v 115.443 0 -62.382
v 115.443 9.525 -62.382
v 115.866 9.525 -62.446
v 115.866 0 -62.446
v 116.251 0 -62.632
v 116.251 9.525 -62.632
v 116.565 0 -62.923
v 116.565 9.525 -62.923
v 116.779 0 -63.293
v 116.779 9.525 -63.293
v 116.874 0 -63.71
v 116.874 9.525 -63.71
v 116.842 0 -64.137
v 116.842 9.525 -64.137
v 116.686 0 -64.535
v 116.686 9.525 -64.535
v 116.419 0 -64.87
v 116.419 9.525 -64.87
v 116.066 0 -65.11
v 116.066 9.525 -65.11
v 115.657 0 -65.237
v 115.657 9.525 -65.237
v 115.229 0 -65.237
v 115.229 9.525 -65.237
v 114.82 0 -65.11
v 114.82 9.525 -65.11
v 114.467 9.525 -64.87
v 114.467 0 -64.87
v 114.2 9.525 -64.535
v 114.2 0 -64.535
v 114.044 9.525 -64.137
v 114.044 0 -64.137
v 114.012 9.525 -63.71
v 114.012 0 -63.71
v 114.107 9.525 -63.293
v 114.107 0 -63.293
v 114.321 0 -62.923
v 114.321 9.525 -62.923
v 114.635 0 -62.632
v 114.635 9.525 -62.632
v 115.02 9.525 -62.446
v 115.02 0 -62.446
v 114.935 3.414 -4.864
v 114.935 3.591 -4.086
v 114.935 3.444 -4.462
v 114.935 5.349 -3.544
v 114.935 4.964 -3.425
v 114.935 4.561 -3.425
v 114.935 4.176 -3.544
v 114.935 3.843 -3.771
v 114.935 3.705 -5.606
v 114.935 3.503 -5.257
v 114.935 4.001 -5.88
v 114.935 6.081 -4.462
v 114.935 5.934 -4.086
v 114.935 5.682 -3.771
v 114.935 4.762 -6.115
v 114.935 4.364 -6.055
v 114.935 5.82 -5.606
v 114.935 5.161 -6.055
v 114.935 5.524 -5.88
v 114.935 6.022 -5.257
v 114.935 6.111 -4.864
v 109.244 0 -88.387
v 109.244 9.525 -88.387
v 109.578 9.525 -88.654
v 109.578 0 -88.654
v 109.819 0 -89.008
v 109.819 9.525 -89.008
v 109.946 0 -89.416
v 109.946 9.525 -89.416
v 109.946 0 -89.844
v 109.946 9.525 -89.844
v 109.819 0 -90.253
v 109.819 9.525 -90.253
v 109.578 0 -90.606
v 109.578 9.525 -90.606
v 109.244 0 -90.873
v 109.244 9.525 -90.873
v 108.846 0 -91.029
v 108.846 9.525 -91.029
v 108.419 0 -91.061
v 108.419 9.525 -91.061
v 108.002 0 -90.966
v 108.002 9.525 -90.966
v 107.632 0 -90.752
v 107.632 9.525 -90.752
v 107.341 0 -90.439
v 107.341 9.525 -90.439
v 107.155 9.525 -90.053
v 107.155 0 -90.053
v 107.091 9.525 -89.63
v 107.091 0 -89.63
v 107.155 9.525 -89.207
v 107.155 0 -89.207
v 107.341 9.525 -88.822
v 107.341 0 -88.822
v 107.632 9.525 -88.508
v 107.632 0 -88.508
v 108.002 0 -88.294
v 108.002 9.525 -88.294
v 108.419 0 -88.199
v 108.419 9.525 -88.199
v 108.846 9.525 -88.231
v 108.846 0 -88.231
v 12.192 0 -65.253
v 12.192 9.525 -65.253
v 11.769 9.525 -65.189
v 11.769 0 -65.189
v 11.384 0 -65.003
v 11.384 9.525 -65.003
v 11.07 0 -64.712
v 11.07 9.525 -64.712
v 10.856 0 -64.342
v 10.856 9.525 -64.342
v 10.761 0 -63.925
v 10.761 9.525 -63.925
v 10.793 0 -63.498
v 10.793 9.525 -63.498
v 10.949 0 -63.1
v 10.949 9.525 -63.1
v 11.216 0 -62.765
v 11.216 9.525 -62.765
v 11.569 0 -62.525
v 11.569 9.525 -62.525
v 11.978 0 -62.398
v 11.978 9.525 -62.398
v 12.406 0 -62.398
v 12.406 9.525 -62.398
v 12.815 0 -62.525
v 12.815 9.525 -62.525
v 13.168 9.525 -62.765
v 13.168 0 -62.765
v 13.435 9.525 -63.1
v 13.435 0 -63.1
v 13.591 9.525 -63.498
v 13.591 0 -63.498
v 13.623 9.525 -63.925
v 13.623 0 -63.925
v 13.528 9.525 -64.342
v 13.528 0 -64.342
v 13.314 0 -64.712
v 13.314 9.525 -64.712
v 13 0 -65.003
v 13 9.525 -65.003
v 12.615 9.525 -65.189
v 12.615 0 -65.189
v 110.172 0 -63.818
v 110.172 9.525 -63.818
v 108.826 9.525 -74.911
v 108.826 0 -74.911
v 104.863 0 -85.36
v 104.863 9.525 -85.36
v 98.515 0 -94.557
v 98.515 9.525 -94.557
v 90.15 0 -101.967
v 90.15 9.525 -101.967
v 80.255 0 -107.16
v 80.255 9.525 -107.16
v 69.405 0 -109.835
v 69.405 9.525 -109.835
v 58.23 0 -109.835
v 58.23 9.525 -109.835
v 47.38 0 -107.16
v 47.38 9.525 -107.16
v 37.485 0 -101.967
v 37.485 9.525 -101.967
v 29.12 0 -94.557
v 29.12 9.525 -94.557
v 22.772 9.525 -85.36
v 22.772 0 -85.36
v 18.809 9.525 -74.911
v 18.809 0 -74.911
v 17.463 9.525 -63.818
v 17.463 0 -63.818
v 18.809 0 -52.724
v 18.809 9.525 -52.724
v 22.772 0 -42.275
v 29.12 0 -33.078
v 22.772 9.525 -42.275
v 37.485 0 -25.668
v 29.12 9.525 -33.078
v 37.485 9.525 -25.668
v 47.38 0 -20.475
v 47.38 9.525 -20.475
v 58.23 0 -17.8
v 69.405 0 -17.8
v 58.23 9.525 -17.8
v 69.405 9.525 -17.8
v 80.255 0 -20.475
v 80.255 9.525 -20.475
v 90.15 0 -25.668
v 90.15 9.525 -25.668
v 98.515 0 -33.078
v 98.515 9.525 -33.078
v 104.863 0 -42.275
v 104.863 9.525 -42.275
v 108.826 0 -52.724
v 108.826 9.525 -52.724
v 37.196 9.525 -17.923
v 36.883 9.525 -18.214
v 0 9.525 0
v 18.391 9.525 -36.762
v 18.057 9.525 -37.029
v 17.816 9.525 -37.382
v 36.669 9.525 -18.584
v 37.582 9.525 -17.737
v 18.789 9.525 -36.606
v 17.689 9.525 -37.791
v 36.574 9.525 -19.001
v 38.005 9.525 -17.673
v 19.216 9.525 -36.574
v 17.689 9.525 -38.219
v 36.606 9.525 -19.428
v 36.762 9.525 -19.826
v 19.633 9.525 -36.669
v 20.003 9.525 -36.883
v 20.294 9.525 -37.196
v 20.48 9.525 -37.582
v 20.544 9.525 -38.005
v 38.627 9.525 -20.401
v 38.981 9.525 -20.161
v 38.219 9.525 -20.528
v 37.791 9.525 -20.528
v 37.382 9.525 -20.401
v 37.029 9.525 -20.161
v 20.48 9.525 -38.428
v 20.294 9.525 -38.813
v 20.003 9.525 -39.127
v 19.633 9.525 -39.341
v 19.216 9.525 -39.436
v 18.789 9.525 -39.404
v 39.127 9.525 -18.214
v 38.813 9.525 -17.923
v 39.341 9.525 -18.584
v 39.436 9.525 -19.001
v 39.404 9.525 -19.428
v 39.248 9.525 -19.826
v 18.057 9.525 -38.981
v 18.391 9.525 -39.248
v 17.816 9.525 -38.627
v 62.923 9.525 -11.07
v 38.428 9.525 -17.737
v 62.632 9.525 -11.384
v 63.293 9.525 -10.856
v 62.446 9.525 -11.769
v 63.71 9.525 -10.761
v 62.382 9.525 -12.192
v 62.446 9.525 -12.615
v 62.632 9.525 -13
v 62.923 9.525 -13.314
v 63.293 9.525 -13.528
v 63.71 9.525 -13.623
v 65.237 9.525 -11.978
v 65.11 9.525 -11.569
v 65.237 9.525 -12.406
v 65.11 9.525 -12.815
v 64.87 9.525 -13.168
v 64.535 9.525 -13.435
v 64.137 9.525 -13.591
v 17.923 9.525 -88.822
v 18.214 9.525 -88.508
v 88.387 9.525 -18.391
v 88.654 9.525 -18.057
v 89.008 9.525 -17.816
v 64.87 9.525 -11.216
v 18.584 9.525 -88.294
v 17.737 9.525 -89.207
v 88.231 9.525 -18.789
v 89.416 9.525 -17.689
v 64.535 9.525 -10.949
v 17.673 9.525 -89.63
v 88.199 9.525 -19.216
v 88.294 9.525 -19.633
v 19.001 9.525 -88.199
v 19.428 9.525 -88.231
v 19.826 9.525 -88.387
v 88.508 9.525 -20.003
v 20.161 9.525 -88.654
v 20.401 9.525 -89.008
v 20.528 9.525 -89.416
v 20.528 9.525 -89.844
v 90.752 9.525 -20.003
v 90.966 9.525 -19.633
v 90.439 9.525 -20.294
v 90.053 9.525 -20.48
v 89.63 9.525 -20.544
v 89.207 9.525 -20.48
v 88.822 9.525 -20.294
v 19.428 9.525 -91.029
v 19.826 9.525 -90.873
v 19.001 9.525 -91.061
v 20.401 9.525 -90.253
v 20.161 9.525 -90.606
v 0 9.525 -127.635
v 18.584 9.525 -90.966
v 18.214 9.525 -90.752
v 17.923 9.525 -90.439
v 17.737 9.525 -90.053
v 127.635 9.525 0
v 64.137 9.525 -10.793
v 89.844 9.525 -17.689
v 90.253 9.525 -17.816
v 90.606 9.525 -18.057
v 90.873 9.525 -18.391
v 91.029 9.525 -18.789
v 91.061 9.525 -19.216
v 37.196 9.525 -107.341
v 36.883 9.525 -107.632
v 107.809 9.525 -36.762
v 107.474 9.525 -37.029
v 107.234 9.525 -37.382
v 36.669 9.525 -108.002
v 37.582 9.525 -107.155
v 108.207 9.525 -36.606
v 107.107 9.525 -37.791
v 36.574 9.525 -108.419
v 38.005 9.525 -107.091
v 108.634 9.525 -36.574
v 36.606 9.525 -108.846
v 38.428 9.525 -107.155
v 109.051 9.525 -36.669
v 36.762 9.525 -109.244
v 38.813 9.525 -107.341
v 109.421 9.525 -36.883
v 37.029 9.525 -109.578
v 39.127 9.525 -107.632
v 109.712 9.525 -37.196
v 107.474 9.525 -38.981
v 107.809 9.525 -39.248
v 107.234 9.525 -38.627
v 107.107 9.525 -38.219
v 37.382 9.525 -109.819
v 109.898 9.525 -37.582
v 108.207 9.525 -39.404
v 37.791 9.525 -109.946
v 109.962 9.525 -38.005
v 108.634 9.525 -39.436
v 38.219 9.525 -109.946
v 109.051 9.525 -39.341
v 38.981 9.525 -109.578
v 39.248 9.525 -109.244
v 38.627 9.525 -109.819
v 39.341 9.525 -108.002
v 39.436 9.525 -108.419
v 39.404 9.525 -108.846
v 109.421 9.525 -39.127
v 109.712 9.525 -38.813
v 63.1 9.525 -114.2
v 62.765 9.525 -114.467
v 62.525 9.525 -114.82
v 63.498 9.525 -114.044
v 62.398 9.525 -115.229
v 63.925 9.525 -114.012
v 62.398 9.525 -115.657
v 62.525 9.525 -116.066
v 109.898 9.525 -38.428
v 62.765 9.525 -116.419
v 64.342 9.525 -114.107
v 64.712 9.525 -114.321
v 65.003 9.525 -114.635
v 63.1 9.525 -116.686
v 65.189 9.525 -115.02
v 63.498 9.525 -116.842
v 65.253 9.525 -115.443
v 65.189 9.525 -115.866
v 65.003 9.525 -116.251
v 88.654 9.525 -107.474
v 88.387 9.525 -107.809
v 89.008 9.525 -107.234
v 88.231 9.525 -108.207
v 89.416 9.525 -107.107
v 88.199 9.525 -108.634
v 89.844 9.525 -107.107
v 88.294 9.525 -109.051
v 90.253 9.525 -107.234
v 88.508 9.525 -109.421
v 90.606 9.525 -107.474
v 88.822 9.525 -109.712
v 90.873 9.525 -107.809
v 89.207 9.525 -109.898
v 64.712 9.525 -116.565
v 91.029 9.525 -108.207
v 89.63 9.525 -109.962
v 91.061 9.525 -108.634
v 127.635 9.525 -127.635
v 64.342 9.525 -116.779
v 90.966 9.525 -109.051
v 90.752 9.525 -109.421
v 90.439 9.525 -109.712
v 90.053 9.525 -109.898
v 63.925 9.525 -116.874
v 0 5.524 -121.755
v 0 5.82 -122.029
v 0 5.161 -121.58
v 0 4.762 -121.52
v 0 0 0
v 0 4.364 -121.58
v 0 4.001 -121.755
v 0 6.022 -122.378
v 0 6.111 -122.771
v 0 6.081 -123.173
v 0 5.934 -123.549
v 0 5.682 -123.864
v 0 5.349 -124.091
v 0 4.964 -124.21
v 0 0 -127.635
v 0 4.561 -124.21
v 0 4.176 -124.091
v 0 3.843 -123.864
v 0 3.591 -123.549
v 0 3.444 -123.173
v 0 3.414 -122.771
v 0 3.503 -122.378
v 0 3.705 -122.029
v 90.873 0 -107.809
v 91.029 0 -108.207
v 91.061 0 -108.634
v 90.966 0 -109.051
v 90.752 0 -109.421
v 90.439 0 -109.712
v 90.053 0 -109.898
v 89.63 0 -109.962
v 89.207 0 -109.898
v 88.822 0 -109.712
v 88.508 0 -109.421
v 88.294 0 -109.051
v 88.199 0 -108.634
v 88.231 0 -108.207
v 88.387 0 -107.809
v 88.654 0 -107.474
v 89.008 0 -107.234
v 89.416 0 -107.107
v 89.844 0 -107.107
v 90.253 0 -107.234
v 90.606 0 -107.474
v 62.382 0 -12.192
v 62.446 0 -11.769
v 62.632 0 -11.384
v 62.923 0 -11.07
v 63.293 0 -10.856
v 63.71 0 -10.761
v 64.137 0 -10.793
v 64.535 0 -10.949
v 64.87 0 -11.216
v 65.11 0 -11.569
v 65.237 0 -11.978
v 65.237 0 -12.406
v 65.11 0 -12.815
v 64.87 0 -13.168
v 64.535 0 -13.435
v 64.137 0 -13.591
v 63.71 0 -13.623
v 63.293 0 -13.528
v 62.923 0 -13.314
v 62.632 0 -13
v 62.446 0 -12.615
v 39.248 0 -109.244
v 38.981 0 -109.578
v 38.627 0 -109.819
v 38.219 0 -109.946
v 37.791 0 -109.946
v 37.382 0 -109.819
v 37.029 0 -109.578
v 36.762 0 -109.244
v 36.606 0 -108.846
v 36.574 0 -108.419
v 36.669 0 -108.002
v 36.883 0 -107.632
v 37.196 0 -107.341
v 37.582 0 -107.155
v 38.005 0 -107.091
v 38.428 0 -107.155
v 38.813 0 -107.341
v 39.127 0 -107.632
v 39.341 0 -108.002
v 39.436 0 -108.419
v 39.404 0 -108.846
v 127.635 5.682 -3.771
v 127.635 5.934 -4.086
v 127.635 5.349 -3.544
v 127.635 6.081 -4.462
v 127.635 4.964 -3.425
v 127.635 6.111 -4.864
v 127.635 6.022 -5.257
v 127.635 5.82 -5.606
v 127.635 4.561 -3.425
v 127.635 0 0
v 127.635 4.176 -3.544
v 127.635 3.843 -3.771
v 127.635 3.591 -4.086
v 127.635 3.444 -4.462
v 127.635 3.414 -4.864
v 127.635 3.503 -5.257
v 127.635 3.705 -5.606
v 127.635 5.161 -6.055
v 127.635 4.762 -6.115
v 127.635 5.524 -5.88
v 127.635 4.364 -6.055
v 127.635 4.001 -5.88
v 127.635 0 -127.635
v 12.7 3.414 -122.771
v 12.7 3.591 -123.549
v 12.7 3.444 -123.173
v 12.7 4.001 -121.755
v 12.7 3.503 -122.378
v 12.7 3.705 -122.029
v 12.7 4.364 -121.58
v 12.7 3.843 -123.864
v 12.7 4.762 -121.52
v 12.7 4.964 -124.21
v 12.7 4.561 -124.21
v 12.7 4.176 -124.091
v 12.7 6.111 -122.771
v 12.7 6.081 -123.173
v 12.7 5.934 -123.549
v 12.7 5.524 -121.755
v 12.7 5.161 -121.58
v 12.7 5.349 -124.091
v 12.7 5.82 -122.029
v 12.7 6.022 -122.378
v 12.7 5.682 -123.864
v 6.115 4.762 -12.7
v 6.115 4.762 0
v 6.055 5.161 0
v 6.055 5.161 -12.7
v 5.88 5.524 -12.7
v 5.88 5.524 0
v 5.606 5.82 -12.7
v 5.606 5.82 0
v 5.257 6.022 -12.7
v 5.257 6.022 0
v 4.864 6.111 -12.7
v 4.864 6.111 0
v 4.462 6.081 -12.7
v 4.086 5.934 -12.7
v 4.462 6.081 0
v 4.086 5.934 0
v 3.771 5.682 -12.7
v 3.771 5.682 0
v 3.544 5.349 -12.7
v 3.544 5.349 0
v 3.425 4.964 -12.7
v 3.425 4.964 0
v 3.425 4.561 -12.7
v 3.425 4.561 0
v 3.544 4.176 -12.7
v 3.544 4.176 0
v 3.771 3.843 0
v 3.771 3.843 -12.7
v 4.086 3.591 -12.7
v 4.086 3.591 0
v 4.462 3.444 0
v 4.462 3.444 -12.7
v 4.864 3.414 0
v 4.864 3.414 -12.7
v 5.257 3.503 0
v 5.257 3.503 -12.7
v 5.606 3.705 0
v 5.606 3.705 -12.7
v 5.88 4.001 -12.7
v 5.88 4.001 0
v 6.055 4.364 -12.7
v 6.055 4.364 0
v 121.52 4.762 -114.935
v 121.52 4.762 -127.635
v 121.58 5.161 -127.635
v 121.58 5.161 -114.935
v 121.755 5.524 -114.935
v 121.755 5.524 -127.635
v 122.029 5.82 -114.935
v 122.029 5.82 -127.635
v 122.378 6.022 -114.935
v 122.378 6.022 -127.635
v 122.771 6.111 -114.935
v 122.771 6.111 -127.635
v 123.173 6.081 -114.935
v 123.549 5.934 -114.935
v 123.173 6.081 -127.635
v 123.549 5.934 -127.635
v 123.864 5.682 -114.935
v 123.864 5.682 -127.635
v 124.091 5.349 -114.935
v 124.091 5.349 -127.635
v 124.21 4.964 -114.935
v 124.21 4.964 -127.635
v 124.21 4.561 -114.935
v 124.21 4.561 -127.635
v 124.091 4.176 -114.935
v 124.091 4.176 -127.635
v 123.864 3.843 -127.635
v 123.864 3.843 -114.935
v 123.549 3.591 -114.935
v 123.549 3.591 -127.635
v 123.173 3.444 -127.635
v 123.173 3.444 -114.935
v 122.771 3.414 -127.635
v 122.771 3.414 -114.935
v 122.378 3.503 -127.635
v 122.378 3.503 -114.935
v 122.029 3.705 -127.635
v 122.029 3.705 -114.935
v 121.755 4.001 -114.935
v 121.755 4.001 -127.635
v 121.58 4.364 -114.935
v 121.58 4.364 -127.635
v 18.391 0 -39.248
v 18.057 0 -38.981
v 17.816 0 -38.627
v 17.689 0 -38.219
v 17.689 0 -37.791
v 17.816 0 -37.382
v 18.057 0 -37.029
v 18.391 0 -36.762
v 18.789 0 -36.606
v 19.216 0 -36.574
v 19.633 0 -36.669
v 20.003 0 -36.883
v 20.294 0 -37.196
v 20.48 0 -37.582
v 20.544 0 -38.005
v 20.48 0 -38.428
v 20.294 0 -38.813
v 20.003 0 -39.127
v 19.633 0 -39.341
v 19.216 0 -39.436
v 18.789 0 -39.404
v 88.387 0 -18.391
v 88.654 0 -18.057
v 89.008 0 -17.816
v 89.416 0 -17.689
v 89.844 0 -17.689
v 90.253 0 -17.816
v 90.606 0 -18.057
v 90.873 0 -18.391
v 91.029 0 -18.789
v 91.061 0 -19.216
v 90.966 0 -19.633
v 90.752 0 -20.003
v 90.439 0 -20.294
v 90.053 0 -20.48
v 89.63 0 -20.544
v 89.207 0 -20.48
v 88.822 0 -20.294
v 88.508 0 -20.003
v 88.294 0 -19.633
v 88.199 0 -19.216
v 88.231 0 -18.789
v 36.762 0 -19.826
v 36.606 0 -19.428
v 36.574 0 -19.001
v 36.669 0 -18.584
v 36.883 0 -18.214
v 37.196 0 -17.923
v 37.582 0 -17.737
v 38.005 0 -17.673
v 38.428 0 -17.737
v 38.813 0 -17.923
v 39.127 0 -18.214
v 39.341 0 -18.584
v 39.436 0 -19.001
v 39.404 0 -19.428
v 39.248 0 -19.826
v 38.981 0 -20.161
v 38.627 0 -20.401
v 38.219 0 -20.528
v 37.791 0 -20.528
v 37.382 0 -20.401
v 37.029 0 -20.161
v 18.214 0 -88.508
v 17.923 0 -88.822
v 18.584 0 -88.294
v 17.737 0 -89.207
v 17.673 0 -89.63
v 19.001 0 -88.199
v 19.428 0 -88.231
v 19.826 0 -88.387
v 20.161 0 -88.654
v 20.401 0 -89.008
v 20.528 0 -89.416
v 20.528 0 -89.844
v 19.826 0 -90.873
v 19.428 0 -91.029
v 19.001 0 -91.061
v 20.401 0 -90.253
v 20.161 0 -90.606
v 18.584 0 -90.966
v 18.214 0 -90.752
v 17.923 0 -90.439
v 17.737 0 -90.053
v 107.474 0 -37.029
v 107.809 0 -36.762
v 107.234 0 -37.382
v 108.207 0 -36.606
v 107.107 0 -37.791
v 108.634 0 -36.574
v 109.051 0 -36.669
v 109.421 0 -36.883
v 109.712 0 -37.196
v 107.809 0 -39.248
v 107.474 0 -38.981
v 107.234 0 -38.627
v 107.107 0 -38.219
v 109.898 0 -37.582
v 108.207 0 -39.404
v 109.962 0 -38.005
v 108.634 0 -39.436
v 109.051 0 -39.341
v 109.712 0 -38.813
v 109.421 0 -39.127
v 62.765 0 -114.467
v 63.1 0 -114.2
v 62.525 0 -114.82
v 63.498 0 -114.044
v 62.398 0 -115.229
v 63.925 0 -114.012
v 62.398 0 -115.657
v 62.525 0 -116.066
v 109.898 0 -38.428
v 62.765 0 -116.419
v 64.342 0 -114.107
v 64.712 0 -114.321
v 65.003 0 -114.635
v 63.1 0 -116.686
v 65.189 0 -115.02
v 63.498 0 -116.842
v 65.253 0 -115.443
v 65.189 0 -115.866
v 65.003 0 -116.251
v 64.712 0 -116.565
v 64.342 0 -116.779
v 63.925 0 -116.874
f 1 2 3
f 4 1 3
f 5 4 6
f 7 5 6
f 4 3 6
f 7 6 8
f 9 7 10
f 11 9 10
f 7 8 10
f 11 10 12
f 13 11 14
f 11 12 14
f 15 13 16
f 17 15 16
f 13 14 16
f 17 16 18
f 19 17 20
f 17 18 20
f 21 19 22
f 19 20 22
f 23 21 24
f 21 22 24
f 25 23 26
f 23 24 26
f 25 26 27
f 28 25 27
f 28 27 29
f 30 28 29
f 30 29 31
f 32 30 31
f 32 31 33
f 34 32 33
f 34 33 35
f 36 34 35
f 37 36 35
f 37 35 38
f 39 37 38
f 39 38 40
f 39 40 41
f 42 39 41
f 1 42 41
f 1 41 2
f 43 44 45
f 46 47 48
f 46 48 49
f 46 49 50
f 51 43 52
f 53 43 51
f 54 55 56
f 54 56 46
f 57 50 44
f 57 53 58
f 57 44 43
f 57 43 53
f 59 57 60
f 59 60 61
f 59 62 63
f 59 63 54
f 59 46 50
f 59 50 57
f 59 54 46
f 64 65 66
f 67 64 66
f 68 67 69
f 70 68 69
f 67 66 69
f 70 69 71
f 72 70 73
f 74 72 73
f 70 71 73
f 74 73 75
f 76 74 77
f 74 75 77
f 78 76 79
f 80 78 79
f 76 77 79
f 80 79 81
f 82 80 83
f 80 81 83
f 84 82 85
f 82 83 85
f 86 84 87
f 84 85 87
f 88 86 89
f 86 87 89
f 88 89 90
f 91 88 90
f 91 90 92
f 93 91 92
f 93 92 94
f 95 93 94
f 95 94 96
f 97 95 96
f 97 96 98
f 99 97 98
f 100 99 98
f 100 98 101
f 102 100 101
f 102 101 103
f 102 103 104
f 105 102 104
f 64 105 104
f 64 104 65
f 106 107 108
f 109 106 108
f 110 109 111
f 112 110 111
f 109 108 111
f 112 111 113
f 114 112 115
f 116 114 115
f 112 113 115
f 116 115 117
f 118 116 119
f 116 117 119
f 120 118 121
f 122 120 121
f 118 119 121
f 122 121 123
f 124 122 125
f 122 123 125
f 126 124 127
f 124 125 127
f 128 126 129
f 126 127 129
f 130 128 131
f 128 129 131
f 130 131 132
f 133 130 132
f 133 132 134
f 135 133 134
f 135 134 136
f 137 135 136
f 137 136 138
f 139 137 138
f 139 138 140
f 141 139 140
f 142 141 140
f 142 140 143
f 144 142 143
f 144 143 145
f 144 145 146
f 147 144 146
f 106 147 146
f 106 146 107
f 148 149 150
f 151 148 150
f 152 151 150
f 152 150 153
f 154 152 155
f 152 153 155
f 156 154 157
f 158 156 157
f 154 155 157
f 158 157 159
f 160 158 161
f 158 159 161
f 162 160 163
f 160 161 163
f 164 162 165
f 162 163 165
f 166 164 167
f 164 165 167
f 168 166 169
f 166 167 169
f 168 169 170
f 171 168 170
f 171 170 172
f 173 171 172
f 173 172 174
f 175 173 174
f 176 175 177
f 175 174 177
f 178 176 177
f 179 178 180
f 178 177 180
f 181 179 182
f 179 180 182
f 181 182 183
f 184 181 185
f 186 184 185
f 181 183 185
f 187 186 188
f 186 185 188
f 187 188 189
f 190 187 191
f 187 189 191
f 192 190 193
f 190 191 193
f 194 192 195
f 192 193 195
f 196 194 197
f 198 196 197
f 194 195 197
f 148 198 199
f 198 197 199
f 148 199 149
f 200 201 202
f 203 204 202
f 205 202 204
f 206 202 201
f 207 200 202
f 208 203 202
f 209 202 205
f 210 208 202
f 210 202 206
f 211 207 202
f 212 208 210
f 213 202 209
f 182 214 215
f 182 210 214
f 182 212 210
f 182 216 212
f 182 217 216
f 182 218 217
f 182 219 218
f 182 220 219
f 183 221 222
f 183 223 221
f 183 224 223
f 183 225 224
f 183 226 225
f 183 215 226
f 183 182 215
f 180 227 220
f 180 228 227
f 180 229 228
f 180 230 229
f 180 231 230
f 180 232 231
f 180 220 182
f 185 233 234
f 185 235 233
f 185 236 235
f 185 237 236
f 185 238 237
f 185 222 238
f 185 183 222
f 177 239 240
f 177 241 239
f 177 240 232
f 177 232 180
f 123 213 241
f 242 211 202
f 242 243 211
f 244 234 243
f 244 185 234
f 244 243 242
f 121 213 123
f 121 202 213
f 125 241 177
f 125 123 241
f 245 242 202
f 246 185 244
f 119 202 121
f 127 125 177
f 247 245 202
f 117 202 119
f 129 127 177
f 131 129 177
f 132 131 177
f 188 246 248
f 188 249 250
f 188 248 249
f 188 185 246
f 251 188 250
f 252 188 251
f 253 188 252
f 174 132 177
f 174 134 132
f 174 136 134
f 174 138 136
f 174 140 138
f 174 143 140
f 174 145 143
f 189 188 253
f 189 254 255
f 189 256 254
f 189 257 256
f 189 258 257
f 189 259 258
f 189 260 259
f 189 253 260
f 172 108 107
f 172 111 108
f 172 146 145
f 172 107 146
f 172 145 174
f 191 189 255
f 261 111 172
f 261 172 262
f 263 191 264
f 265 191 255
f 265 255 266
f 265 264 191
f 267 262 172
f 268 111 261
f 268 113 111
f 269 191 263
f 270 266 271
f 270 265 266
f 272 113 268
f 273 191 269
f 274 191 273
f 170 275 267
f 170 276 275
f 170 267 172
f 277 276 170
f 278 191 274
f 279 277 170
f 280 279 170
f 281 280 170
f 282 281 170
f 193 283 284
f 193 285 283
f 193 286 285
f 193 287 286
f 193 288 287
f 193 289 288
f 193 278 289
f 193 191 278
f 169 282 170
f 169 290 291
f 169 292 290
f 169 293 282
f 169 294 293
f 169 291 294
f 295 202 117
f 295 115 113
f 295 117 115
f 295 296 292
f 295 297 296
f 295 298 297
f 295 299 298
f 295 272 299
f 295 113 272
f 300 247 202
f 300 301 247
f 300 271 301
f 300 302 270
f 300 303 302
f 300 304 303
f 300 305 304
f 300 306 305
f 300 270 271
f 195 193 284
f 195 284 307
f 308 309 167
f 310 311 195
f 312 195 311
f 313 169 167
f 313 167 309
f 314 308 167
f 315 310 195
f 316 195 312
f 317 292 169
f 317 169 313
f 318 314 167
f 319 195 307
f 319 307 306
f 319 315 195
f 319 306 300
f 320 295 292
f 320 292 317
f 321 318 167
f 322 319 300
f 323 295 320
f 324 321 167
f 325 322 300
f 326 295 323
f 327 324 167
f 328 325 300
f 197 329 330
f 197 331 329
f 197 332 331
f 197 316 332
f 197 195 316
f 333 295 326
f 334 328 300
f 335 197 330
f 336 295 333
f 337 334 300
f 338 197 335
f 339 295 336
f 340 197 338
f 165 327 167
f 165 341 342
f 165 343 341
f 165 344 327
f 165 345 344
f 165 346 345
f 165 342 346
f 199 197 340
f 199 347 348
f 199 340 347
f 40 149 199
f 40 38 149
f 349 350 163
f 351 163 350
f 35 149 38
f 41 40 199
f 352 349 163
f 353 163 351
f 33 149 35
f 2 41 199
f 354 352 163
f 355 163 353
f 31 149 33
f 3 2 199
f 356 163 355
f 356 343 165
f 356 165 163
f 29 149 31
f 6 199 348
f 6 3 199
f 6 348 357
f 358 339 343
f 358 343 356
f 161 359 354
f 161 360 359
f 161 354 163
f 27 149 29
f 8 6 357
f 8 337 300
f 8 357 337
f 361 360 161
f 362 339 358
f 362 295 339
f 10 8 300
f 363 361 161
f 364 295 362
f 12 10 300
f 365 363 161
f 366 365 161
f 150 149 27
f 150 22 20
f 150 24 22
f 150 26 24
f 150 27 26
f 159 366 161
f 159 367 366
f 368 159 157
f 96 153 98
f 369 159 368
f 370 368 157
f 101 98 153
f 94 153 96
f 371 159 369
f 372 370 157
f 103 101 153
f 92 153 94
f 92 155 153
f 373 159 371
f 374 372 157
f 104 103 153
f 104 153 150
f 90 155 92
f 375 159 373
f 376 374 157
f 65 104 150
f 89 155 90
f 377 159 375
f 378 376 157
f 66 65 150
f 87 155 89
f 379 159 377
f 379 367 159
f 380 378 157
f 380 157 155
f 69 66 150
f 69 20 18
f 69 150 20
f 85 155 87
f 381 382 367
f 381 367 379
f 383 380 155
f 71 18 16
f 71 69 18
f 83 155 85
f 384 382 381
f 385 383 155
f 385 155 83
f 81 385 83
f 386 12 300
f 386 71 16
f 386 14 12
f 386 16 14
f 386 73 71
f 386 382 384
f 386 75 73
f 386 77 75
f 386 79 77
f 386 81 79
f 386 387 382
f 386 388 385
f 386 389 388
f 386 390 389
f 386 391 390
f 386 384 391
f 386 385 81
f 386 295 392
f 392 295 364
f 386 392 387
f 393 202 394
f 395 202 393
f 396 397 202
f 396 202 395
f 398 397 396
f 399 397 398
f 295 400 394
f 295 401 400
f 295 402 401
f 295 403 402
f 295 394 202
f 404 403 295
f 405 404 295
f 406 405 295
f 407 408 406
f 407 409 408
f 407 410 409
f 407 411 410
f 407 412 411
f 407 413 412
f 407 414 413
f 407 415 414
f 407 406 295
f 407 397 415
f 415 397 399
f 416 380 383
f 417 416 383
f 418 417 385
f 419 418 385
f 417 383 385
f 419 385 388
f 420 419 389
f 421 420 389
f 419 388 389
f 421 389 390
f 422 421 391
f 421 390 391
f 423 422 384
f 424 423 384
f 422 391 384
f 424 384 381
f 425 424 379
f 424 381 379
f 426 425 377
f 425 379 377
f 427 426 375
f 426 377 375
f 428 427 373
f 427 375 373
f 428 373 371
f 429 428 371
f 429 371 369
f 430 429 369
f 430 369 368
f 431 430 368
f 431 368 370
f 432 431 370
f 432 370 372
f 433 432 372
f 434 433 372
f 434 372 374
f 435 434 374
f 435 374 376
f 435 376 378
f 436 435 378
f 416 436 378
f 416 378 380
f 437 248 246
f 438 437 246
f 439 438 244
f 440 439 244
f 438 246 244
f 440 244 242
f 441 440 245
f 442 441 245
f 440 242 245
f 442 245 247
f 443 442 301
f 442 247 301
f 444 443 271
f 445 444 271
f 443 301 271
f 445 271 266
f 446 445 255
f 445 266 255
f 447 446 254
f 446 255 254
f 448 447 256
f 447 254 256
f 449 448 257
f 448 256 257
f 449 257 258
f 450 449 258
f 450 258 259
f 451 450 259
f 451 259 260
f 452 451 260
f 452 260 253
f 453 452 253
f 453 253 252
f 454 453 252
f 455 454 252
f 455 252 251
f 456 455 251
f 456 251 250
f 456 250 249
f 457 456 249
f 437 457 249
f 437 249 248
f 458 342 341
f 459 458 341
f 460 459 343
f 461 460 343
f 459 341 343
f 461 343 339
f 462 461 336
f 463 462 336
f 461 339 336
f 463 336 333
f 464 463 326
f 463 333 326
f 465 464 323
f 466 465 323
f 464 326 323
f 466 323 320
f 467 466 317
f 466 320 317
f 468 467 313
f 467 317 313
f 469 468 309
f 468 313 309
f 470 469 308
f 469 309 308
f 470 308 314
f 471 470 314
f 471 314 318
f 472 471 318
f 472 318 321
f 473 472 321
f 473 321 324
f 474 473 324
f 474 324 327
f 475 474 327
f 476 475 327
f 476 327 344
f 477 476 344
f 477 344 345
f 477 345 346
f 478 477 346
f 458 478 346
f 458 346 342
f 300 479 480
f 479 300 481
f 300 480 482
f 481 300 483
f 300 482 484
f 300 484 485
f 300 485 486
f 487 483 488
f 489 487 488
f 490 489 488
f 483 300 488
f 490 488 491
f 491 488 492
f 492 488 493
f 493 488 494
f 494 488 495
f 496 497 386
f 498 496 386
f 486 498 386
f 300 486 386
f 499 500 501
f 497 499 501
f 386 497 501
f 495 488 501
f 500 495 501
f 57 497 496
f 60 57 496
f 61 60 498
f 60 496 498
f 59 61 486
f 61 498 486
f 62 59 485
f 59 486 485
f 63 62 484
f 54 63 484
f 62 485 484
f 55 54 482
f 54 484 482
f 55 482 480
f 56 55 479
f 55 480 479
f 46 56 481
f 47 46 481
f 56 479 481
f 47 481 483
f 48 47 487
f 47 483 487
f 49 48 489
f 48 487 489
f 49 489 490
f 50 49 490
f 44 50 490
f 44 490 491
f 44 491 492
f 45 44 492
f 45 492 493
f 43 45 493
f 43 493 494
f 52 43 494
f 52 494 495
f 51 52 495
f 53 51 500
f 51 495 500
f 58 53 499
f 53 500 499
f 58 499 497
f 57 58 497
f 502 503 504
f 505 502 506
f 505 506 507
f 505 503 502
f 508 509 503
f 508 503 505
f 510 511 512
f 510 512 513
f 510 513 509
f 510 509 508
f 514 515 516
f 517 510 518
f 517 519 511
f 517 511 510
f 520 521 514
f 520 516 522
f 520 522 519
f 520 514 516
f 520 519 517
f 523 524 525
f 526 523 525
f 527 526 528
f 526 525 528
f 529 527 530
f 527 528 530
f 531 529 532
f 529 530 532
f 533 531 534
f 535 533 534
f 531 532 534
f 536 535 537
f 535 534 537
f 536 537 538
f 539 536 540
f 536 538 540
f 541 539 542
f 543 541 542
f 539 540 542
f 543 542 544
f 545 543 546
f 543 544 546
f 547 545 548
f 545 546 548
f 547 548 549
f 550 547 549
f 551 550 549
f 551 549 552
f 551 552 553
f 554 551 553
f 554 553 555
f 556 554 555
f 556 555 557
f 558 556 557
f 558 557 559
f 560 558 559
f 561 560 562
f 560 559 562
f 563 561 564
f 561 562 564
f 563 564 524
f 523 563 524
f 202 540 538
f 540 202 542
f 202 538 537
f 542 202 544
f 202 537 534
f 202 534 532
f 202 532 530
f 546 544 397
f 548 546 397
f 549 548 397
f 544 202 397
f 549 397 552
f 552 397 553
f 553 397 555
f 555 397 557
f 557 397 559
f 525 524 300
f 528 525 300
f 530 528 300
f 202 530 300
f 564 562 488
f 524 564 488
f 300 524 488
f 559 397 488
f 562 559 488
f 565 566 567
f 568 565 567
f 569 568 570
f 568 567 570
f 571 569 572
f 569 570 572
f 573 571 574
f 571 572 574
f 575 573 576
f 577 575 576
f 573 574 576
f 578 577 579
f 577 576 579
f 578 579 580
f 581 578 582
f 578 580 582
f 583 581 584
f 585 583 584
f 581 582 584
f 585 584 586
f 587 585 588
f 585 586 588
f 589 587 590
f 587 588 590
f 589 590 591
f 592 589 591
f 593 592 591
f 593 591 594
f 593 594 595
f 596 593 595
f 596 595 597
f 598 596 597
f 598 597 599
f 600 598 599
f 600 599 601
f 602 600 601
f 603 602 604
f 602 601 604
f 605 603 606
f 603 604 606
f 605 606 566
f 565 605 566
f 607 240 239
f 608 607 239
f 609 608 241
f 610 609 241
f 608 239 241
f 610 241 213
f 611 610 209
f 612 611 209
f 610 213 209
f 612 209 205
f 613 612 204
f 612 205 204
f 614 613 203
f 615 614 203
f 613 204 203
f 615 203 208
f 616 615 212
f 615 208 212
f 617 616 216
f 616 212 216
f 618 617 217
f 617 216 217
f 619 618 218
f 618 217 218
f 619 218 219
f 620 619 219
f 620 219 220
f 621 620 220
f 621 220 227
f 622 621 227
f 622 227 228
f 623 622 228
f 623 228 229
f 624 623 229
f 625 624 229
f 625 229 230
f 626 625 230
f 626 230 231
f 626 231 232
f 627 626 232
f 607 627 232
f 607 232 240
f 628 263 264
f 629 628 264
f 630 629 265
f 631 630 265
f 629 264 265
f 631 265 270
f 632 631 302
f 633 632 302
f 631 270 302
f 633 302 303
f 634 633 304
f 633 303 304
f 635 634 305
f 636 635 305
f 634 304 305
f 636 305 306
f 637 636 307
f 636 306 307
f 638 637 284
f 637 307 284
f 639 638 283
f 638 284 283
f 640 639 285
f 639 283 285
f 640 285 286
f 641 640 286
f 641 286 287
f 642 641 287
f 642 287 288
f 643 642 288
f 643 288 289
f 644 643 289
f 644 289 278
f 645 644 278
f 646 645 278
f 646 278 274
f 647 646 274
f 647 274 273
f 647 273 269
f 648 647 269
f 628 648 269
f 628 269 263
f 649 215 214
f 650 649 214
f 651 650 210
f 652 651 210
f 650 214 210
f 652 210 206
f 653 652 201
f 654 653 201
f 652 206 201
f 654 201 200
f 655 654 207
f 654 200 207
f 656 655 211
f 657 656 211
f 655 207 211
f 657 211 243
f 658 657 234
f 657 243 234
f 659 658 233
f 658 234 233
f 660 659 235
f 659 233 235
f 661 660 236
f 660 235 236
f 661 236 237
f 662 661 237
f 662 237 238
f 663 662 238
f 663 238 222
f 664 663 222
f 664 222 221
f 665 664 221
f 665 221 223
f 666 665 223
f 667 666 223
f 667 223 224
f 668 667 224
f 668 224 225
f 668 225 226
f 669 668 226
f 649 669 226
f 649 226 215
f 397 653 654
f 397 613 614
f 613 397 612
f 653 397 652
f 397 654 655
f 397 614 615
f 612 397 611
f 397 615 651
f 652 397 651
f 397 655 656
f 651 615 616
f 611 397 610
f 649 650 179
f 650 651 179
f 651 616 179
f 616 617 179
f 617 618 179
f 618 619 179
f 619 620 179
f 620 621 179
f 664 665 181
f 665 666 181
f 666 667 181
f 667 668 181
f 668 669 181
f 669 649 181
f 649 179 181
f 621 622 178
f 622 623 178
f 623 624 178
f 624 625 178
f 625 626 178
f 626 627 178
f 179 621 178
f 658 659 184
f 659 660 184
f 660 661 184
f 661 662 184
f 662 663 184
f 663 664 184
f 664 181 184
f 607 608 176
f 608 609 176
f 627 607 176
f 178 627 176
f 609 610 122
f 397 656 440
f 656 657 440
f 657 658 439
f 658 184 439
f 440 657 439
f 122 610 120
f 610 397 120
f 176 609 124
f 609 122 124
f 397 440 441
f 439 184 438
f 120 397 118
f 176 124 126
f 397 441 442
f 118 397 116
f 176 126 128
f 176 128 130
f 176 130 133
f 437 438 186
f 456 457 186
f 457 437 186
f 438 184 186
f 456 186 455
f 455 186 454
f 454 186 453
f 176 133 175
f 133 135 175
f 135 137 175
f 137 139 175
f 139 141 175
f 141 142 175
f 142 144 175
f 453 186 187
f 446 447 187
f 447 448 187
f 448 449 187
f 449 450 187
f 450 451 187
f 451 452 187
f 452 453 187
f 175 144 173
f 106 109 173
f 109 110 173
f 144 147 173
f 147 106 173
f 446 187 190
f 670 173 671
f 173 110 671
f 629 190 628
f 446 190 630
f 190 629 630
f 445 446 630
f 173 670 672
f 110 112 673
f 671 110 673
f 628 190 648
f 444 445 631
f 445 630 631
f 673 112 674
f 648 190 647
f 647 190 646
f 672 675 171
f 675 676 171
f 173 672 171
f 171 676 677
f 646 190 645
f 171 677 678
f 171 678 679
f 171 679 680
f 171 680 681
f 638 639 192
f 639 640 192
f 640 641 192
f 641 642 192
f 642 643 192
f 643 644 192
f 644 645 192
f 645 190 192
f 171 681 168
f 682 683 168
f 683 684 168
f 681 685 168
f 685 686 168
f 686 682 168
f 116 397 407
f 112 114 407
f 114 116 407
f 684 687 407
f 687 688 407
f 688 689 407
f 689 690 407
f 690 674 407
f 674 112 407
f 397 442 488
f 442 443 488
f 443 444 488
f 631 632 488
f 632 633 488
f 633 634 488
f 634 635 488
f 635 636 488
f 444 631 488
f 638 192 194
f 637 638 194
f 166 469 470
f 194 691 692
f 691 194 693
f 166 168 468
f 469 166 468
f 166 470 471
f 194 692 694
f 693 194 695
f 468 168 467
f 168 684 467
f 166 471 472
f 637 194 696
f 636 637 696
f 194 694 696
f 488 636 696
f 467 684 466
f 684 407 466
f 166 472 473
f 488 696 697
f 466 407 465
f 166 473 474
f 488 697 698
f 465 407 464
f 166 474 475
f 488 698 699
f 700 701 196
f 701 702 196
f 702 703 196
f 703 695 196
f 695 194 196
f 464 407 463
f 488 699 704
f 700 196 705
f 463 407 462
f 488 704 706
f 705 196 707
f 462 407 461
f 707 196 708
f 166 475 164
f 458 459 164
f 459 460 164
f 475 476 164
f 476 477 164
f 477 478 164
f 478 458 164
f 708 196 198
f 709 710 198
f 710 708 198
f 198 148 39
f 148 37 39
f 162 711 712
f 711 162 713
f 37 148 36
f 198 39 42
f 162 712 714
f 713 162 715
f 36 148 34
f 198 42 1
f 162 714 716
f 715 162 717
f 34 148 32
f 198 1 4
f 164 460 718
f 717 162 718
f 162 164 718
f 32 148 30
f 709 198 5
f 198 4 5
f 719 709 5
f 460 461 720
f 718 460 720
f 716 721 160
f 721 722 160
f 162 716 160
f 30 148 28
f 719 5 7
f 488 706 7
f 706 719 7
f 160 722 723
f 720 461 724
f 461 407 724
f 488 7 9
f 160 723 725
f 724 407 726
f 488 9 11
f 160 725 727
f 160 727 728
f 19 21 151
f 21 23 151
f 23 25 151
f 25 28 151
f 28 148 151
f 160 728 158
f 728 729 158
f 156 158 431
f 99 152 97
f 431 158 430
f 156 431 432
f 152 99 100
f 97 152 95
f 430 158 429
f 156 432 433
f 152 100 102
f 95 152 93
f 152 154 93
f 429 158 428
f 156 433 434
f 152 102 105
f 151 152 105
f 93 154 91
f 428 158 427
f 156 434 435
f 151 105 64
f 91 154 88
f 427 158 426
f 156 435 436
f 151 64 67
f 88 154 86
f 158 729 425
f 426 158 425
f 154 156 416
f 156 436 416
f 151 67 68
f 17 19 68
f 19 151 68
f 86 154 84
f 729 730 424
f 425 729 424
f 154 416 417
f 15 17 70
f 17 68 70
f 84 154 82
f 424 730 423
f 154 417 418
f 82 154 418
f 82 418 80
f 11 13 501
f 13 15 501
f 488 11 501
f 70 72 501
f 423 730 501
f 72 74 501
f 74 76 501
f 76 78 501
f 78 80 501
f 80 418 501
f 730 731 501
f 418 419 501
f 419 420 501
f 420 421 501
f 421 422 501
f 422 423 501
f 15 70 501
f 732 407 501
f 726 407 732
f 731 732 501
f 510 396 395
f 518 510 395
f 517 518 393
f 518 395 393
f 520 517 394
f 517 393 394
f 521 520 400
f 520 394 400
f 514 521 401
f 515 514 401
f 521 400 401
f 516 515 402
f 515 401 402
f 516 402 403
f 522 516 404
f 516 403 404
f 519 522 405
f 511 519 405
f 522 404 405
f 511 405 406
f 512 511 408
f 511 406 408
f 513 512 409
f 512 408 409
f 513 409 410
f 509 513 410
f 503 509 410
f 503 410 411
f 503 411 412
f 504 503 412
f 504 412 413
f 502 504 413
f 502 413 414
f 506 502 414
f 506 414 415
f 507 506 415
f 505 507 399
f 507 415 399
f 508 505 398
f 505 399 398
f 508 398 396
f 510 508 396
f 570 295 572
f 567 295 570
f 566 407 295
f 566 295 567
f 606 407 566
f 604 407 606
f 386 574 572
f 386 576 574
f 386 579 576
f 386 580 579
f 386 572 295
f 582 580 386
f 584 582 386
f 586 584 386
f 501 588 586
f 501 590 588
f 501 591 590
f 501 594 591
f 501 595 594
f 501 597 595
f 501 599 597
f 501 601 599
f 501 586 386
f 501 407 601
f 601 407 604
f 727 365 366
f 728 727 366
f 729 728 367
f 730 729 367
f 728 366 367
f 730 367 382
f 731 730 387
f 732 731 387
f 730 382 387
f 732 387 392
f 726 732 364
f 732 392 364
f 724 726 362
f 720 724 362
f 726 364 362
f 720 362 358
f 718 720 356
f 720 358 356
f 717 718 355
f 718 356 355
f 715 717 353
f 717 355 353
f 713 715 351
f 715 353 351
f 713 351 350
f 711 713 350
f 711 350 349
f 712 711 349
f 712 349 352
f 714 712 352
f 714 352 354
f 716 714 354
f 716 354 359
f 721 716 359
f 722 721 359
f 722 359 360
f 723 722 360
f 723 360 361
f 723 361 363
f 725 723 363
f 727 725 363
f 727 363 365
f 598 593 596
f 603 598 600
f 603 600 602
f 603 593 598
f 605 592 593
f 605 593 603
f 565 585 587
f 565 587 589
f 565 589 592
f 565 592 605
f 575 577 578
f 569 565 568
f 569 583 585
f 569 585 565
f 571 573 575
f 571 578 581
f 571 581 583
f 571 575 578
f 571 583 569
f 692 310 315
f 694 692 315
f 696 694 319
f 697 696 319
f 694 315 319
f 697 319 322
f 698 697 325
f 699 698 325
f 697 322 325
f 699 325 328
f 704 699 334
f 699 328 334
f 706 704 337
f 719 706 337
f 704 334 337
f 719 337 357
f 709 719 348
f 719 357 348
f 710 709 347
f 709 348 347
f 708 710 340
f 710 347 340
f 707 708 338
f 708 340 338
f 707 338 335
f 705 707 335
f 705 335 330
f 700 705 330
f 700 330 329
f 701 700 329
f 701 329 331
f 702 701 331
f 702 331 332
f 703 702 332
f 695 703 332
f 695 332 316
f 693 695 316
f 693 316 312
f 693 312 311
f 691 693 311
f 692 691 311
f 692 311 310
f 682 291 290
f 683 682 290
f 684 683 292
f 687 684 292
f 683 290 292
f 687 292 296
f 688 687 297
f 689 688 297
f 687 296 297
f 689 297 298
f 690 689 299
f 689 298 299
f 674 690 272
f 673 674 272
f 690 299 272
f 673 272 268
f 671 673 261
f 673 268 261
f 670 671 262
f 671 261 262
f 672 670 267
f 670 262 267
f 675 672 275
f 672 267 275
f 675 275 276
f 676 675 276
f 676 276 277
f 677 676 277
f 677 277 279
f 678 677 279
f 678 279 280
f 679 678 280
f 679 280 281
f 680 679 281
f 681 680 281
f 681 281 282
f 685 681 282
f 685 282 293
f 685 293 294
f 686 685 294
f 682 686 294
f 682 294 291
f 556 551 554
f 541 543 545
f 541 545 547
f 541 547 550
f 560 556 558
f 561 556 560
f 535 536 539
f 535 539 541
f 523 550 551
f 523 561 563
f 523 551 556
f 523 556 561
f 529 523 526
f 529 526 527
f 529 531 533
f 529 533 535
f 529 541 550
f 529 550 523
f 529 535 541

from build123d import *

# Parameters (mm, degrees)
SKETCH1_W           = 127.635
SKETCH1_H           = 127.635
BOSS_EXTRUDE1_DEPTH = 9.525
SKETCH5_R           = 46.355
CUT_EXTRUDE1_DEPTH  = 9.525
SKETCH11_R          = 1.4351
CUT_EXTRUDE3_DEPTH  = 10.525
CIRPATTERN1_COUNT   = 12
SKETCH6_R           = 1.35255
F_6_32_HOLE1_DEPTH  = 12.7
SKETCH7_R           = 1.35255
F_6_32_HOLE2_DEPTH  = 12.7
SKETCH8_R           = 1.35255
F_6_32_HOLE3_DEPTH  = 12.7
SKETCH9_R           = 1.35255
F_6_32_HOLE4_DEPTH  = 12.7


with BuildPart() as part:
    # Sketch1 → Boss-Extrude1 (new body)
    with BuildSketch(Plane(origin=(0, 0, 0), x_dir=(1, 0, 0), z_dir=(0, 1, 0))):
        with Locations((63.8175, 63.8175)):
            Rectangle(SKETCH1_W, SKETCH1_H)
    extrude(amount=BOSS_EXTRUDE1_DEPTH)

    # Sketch5 → Cut-Extrude1 (cut)
    with BuildSketch(Plane(origin=(0, 9.525, 0), x_dir=(1, 0, 0), z_dir=(0, 1, 0))):
        with Locations((63.8175, 63.8175)):
            Circle(SKETCH5_R)
    extrude(amount=-CUT_EXTRUDE1_DEPTH, mode=Mode.SUBTRACT)

    # Sketch11 → Cut-Extrude3 (cut, through all)
    with BuildSketch(Plane(origin=(0, 9.525, 0), x_dir=(1, 0, 0), z_dir=(0, 1, 0))):
        with Locations((63.8175, 115.443)):
            Circle(SKETCH11_R)
    cut_extrude3 = extrude(amount=-CUT_EXTRUDE3_DEPTH, mode=Mode.SUBTRACT)

    # CirPattern1: Cut-Extrude3 ×12 about axis
    cirpattern1_axis = Axis((63.8175, 0, -63.8175), (0, 1, 0))
    for i in range(1, CIRPATTERN1_COUNT):
        add(cut_extrude3.rotate(cirpattern1_axis, i * 360 / CIRPATTERN1_COUNT), mode=Mode.SUBTRACT)

    # Sketch6 → 6-32 hole1 (cut)
    with BuildSketch(Plane(origin=(127.635, 0, 0), x_dir=(0, 0, -1), z_dir=(1, 0, 0))):
        with Locations((4.7625, 4.7625)):
            Circle(SKETCH6_R)
    extrude(amount=-F_6_32_HOLE1_DEPTH, mode=Mode.SUBTRACT)

    # Sketch7 → 6-32 hole2 (cut)
    with BuildSketch(Plane(origin=(0, 0, -127.635), x_dir=(-1, 0, 0), z_dir=(0, 0, -1))):
        with Locations((-122.8725, 4.7625)):
            Circle(SKETCH7_R)
    extrude(amount=-F_6_32_HOLE2_DEPTH, mode=Mode.SUBTRACT)

    # Sketch8 → 6-32 hole3 (cut)
    with BuildSketch(Plane.ZY):
        with Locations((-122.8725, 4.7625)):
            Circle(SKETCH8_R)
    extrude(amount=-F_6_32_HOLE3_DEPTH, mode=Mode.SUBTRACT)

    # Sketch9 → 6-32 hole4 (cut)
    with BuildSketch(Plane.XY):
        with Locations((4.7625, 4.7625)):
            Circle(SKETCH9_R)
    extrude(amount=-F_6_32_HOLE4_DEPTH, mode=Mode.SUBTRACT)


solid = part.part
